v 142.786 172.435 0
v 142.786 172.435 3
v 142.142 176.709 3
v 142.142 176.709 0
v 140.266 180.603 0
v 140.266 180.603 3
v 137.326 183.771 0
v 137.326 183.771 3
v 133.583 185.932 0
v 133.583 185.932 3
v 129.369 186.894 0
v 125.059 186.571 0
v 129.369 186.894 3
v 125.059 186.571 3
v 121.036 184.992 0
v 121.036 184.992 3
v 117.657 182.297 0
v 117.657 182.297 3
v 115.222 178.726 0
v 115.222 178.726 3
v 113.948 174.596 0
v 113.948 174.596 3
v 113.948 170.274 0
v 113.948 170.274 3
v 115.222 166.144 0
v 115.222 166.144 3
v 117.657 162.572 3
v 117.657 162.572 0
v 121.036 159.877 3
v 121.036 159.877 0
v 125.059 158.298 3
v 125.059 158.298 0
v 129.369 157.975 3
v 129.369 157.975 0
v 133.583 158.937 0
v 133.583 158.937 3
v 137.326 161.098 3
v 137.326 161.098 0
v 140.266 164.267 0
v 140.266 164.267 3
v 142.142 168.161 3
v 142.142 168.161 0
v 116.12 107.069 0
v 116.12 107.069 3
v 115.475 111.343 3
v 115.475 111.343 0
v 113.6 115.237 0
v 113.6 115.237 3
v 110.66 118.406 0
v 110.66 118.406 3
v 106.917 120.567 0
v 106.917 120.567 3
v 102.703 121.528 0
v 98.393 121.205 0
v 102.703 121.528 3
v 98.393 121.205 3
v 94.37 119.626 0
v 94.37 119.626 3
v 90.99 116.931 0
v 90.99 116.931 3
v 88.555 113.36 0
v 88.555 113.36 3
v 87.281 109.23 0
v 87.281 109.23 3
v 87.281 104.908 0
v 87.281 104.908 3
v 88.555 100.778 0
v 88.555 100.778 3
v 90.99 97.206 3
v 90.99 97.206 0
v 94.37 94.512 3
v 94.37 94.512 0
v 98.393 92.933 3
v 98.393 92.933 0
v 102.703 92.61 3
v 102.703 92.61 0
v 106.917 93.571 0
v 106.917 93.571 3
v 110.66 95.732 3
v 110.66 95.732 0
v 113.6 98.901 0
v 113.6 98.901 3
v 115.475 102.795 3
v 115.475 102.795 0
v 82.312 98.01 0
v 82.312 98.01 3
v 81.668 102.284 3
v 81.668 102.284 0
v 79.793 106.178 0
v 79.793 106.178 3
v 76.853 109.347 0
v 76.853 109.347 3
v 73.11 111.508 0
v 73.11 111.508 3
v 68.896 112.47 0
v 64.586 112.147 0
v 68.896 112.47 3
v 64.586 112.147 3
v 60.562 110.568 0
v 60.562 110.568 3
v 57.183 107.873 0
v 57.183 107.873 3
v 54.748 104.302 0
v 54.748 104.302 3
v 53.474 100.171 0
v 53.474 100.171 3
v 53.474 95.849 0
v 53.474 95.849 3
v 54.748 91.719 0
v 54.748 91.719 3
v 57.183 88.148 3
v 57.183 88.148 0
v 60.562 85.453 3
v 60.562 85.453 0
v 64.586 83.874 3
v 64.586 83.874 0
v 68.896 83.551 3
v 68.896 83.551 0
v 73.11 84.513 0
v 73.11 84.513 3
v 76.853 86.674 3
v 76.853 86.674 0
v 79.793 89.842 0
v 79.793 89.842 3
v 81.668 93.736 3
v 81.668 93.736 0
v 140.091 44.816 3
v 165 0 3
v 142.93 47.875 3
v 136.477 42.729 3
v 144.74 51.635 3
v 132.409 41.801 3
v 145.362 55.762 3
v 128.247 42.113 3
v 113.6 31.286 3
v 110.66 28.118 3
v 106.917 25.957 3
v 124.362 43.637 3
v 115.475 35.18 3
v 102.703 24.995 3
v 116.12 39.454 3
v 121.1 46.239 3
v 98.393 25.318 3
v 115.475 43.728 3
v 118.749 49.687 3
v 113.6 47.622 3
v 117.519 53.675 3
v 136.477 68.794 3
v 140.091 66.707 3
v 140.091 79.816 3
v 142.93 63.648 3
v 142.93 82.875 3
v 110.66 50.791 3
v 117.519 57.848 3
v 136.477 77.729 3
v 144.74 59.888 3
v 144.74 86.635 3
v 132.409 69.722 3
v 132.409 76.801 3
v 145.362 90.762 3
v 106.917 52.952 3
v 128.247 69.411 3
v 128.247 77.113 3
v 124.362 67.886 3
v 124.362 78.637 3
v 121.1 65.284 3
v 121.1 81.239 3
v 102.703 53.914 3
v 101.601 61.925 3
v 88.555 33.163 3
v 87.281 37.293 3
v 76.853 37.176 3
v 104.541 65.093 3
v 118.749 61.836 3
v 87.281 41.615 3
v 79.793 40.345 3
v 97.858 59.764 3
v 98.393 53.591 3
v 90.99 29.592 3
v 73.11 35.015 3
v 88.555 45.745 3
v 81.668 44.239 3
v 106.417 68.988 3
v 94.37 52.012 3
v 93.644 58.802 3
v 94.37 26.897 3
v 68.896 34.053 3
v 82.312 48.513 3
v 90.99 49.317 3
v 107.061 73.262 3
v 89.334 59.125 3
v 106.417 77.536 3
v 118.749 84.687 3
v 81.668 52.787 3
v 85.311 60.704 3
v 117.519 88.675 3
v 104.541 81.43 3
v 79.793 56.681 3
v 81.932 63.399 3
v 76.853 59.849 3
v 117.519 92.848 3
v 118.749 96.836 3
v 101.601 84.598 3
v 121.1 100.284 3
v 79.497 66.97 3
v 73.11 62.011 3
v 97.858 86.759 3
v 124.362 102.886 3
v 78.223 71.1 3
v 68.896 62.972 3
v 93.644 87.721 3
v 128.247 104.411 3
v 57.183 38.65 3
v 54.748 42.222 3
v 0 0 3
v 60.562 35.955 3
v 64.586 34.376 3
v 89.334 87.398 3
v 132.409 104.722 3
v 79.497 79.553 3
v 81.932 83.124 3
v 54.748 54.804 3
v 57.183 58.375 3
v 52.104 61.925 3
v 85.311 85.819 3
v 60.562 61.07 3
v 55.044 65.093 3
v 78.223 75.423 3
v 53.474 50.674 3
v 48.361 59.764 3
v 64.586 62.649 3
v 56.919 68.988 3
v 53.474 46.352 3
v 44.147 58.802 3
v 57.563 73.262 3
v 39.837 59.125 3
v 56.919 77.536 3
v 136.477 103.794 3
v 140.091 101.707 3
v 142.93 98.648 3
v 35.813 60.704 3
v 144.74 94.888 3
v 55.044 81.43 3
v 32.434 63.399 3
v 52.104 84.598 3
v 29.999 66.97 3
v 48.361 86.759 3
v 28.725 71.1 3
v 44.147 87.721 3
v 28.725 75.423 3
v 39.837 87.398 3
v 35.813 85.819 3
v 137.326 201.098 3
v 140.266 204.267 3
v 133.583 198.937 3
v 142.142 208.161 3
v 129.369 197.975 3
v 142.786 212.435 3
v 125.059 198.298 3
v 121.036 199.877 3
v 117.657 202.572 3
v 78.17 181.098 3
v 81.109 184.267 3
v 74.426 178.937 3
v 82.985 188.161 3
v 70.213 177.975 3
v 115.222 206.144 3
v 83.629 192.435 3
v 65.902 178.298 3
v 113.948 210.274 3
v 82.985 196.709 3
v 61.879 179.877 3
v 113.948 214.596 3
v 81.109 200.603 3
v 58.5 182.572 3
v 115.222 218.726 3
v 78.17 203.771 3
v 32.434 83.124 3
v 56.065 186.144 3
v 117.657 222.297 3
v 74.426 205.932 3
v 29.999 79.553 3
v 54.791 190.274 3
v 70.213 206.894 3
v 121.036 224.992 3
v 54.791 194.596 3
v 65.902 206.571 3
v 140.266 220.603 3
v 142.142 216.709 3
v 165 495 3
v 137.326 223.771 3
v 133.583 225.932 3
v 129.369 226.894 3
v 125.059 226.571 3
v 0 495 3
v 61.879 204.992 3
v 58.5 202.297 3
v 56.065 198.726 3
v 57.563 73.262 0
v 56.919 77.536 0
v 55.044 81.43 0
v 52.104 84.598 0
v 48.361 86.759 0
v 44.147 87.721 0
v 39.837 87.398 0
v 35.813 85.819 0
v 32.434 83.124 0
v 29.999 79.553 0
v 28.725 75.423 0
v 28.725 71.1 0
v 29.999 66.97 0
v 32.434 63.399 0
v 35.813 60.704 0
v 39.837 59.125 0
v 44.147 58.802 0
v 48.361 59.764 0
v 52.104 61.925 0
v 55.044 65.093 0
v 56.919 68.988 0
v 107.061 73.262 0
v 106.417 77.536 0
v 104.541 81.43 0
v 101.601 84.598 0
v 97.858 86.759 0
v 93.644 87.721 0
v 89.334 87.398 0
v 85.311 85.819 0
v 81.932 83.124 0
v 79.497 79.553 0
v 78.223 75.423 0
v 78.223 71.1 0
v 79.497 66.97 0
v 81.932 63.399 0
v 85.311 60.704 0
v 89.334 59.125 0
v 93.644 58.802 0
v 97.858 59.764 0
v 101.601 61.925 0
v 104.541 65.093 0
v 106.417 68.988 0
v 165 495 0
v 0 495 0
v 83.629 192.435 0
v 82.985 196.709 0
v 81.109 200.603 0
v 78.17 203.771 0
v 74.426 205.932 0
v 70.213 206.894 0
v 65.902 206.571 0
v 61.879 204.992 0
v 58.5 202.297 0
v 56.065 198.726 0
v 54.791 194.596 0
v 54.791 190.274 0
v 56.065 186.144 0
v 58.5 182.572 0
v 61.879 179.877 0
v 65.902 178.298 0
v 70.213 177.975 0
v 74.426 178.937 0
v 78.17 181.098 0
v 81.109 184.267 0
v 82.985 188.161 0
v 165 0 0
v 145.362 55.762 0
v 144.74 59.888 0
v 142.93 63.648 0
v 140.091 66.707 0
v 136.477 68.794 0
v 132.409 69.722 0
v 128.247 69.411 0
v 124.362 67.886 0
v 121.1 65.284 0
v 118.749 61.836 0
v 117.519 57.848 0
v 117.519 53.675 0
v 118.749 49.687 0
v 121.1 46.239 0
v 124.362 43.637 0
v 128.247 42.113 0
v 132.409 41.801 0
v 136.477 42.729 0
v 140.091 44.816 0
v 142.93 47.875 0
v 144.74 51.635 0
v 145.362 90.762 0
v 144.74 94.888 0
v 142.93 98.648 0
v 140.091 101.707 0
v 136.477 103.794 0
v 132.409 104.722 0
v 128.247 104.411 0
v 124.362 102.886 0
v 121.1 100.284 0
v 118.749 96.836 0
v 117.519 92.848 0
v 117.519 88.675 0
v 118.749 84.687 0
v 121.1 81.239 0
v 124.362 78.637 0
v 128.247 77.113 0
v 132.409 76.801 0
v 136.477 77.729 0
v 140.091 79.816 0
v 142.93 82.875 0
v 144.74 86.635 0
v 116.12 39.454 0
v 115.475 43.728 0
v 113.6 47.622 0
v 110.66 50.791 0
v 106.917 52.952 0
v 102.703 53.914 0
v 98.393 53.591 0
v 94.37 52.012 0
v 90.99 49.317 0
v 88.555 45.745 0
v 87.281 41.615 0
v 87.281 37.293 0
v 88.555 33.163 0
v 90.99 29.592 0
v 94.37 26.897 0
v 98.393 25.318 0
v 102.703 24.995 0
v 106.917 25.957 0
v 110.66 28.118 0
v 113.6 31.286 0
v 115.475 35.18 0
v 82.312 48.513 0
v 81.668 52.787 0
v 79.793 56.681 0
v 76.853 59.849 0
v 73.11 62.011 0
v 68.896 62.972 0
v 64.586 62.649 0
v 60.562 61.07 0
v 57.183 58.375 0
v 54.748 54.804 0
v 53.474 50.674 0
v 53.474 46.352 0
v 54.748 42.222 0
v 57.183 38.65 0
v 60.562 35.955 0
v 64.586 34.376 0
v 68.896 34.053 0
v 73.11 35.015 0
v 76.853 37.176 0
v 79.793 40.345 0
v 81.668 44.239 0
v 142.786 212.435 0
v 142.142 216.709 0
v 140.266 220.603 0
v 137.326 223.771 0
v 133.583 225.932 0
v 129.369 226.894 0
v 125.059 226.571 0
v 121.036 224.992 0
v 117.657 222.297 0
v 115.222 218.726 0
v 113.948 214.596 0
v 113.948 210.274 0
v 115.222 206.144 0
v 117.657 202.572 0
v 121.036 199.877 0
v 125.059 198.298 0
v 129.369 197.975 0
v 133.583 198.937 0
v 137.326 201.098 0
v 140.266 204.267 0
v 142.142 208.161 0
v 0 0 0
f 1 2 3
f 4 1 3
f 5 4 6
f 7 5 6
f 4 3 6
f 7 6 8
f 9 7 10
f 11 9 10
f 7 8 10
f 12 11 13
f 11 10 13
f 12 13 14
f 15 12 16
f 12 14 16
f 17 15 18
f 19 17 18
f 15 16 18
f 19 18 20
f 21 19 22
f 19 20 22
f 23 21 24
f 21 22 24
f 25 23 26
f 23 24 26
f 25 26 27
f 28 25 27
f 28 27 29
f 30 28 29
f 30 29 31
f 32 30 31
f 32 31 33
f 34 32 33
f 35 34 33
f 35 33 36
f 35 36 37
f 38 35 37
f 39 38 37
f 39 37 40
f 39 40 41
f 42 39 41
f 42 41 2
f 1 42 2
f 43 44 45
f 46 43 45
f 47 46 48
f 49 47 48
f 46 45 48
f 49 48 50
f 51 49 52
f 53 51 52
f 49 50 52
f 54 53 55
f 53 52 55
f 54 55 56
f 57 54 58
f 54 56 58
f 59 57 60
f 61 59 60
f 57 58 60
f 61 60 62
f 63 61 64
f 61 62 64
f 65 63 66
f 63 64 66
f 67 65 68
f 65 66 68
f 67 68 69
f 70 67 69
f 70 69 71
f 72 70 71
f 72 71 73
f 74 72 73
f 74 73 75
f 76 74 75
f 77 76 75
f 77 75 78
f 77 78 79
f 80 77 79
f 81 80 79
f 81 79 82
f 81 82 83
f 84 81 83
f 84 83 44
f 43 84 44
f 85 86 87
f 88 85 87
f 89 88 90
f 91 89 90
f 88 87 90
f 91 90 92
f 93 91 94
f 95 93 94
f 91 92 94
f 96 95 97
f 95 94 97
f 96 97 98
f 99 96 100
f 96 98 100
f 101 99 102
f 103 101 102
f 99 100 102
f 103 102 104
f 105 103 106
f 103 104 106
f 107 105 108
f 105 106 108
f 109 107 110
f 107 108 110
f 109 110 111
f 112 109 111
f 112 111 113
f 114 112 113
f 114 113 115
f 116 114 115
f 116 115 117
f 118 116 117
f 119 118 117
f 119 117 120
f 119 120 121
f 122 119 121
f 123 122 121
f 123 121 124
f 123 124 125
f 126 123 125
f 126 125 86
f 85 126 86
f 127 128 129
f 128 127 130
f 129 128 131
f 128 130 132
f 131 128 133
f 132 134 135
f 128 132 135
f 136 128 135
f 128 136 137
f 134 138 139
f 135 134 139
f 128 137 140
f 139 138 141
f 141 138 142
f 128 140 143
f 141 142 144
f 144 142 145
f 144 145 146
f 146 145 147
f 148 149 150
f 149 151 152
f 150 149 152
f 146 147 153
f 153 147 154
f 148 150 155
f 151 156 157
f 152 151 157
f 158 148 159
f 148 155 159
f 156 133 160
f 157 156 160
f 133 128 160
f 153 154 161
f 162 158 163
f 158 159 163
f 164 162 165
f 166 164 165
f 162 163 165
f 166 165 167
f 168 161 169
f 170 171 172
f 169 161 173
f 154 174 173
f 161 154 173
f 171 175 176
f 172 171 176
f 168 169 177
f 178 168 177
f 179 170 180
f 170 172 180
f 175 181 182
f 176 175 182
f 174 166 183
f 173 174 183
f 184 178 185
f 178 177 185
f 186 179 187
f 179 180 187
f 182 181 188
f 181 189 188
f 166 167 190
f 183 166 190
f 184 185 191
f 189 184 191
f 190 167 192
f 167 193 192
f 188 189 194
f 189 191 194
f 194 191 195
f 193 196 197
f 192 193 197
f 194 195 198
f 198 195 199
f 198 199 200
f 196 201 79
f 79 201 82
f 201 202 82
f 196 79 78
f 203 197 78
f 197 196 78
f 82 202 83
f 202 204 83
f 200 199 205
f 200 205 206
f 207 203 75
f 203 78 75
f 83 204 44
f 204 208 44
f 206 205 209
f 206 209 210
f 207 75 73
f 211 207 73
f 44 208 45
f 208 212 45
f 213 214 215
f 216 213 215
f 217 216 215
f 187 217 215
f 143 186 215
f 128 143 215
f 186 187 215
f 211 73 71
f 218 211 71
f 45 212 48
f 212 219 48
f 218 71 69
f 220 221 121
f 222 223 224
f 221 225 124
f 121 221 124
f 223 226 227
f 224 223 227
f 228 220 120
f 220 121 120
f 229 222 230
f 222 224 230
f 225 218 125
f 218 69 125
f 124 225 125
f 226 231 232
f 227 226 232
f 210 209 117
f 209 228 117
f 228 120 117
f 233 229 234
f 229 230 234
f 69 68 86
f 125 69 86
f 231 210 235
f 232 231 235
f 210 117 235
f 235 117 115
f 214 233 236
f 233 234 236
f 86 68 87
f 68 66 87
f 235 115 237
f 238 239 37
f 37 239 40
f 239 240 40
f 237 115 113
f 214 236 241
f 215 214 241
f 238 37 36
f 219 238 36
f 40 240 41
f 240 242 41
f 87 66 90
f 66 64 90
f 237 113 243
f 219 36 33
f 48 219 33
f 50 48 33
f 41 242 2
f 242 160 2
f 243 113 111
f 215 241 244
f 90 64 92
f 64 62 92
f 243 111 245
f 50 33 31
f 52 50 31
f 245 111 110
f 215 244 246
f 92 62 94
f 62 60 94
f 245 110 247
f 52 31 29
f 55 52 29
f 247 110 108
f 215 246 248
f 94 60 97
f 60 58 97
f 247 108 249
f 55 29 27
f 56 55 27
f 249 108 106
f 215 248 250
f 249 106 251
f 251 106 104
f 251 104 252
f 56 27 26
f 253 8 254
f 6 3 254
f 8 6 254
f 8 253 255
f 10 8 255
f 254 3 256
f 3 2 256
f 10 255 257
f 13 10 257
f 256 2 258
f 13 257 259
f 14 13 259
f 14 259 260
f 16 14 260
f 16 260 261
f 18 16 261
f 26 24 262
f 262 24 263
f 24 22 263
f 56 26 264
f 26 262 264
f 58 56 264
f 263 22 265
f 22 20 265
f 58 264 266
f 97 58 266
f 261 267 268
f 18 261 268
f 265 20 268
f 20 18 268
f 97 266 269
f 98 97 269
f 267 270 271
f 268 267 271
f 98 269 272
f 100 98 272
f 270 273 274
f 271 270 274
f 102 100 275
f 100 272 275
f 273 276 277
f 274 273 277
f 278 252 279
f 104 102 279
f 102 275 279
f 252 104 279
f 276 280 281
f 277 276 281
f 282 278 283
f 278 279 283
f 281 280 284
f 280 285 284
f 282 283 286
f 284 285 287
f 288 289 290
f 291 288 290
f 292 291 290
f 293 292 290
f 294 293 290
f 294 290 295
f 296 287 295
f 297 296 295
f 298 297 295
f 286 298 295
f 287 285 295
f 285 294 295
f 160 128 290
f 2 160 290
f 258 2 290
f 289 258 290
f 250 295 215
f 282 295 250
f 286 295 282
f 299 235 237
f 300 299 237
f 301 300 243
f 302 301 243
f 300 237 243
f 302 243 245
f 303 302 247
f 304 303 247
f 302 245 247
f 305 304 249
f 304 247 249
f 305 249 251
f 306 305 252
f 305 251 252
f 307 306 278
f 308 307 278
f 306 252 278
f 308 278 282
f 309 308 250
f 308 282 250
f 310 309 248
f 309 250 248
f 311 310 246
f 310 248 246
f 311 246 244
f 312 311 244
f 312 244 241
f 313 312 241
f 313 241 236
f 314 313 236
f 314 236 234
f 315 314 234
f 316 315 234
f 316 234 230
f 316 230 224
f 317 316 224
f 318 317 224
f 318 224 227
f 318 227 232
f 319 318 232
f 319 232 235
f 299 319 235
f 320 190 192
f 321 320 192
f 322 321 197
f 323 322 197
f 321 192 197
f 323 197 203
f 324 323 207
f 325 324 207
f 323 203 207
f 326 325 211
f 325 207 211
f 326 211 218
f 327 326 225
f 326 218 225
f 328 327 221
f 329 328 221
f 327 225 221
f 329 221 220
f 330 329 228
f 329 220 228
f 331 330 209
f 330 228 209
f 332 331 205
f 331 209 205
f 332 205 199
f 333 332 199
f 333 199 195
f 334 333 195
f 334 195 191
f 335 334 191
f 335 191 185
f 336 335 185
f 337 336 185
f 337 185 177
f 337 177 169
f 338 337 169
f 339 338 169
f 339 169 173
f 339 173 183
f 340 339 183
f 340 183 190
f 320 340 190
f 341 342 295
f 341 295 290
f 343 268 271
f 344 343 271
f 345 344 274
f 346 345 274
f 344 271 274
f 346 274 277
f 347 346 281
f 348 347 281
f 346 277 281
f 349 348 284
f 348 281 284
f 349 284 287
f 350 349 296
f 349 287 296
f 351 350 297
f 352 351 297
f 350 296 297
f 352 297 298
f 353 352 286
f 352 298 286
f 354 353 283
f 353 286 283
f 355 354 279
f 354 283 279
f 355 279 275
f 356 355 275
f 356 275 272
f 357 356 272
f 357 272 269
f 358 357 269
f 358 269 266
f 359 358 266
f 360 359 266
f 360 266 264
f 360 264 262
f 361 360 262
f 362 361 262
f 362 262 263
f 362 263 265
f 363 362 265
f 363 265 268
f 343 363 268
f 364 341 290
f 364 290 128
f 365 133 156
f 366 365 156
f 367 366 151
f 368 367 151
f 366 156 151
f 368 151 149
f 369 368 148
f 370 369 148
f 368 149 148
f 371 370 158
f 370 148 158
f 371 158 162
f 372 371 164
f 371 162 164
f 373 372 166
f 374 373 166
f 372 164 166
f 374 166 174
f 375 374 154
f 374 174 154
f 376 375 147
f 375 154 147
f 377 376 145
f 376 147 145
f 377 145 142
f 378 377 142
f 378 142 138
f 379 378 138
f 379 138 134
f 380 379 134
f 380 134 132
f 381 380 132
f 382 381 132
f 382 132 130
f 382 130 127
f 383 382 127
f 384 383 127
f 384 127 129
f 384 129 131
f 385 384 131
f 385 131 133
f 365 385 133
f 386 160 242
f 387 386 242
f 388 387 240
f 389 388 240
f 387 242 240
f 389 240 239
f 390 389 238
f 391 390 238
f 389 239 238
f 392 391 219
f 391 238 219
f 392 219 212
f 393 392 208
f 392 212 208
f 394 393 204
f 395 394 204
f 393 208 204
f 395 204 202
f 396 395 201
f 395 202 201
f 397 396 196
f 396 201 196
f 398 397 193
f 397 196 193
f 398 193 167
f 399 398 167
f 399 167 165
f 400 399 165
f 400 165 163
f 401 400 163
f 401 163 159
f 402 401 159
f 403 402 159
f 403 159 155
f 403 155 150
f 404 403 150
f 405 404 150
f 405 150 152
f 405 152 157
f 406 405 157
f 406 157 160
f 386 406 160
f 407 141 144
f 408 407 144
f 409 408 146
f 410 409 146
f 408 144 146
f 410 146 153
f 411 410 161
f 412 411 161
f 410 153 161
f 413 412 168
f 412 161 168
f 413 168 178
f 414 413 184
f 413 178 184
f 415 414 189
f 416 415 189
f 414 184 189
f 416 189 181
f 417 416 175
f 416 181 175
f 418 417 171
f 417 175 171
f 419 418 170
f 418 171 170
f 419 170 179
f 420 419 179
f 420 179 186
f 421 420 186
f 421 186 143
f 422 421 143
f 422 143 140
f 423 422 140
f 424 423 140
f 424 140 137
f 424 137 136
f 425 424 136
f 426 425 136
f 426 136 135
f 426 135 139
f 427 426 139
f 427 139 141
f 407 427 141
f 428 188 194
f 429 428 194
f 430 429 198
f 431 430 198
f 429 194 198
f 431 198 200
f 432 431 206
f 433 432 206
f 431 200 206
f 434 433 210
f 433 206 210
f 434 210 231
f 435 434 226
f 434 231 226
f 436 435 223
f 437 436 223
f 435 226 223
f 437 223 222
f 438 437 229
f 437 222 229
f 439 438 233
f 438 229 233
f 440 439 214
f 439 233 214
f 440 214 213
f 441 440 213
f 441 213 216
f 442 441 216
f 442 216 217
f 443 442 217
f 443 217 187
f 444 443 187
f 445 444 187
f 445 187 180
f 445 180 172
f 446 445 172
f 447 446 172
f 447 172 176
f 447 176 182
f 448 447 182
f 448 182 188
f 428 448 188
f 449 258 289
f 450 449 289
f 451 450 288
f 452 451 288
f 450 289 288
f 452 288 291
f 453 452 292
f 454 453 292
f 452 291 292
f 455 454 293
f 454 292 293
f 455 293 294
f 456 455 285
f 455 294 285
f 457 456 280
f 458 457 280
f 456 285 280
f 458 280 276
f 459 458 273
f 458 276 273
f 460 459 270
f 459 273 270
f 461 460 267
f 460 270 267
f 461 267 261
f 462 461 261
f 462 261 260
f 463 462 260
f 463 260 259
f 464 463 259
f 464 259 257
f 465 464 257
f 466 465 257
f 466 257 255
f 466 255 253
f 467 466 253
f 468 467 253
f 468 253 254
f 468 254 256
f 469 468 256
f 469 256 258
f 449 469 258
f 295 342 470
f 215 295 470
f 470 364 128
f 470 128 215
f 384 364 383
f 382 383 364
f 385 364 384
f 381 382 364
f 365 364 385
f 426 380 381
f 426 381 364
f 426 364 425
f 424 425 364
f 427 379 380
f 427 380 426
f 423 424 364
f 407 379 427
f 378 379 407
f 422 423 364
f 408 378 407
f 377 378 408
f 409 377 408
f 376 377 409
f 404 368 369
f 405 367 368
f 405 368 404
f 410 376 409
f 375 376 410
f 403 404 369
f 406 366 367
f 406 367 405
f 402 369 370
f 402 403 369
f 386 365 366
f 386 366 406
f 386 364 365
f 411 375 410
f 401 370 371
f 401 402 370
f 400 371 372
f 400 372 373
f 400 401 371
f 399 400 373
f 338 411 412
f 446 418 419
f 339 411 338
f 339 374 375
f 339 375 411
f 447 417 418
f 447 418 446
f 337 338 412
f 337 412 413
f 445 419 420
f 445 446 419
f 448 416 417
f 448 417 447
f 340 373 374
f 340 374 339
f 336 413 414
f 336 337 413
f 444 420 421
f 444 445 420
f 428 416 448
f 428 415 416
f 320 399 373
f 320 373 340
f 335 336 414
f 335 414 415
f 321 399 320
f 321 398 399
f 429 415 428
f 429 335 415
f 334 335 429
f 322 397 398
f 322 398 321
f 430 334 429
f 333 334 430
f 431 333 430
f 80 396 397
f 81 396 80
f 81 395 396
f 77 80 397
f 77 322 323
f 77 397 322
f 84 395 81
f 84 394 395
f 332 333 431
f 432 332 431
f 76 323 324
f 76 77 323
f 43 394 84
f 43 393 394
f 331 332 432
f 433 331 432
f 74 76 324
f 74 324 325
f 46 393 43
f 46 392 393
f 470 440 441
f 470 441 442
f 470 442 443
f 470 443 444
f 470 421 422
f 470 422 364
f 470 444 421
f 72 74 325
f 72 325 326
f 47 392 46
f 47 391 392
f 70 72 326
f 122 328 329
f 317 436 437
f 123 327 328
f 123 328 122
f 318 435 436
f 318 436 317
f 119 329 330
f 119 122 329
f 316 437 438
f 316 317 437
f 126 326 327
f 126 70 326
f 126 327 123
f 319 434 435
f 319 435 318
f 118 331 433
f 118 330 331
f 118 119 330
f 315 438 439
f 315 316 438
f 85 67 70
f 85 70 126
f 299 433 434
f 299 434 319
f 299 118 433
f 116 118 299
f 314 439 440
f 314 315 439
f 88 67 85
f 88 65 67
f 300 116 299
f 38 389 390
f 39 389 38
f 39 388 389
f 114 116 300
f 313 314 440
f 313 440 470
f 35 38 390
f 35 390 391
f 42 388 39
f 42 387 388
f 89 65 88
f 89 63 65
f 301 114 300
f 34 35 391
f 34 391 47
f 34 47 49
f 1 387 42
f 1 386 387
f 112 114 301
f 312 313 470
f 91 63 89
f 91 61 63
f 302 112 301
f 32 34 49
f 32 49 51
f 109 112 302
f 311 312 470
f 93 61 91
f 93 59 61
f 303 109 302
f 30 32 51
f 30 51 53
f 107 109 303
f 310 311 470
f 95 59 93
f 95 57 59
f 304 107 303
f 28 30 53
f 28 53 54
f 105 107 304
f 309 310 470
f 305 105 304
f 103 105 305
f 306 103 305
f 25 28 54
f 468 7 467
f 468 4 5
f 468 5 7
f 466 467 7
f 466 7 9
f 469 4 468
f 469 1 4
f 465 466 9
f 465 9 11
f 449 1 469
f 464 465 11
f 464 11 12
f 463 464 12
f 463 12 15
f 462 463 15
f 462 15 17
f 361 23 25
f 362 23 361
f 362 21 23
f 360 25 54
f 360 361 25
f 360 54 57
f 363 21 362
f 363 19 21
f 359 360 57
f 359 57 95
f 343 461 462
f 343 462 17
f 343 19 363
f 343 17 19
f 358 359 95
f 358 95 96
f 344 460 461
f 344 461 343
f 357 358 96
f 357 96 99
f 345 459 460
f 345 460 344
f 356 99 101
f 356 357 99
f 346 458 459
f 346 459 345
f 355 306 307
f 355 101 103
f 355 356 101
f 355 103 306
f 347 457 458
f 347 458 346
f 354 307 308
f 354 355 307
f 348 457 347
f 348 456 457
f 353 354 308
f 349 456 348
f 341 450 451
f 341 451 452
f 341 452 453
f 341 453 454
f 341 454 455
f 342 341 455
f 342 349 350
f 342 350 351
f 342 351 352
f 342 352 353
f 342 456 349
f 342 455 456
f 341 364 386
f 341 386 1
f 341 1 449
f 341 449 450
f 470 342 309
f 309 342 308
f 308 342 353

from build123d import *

# Parameters (mm, degrees)
PAD_DEPTH     = 3
SKETCH001_R   = 14.5
SKETCH001_R_2 = 14
POCKET_DEPTH  = 3.001


with BuildPart() as part:
    # Sketch → Pad (new body)
    with BuildSketch(Plane.XY):
        Polygon((0, 495), (165, 495), (165, 0), (0, 0), (0, 247.5), align=None)
    extrude(amount=PAD_DEPTH)

    # Sketch001 (on Face7 of Pad) → Pocket (cut, through all)
    with BuildSketch(Plane.XY.offset(3)):
        with Locations((69.128997, 192.43482)):
            Circle(SKETCH001_R)
        with Locations((43.063397, 73.261589)):
            Circle(SKETCH001_R)
        with Locations((67.812135, 98.010326)):
            Circle(SKETCH001_R)
        with Locations((67.812135, 48.512852)):
            Circle(SKETCH001_R)
        with Locations((92.560872, 73.261589)):
            Circle(SKETCH001_R)
        with Locations((101.619539, 107.068993)):
            Circle(SKETCH001_R)
        with Locations((101.619539, 39.454185)):
            Circle(SKETCH001_R)
        with Locations((128.285753, 172.43482)):
            Circle(SKETCH001_R)
        with Locations((128.285753, 212.43482)):
            Circle(SKETCH001_R)
        with Locations((131.362427, 90.761589)):
            Circle(SKETCH001_R_2)
        with Locations((131.362427, 55.761589)):
            Circle(SKETCH001_R_2)
    extrude(amount=-POCKET_DEPTH, mode=Mode.SUBTRACT)


solid = part.part
